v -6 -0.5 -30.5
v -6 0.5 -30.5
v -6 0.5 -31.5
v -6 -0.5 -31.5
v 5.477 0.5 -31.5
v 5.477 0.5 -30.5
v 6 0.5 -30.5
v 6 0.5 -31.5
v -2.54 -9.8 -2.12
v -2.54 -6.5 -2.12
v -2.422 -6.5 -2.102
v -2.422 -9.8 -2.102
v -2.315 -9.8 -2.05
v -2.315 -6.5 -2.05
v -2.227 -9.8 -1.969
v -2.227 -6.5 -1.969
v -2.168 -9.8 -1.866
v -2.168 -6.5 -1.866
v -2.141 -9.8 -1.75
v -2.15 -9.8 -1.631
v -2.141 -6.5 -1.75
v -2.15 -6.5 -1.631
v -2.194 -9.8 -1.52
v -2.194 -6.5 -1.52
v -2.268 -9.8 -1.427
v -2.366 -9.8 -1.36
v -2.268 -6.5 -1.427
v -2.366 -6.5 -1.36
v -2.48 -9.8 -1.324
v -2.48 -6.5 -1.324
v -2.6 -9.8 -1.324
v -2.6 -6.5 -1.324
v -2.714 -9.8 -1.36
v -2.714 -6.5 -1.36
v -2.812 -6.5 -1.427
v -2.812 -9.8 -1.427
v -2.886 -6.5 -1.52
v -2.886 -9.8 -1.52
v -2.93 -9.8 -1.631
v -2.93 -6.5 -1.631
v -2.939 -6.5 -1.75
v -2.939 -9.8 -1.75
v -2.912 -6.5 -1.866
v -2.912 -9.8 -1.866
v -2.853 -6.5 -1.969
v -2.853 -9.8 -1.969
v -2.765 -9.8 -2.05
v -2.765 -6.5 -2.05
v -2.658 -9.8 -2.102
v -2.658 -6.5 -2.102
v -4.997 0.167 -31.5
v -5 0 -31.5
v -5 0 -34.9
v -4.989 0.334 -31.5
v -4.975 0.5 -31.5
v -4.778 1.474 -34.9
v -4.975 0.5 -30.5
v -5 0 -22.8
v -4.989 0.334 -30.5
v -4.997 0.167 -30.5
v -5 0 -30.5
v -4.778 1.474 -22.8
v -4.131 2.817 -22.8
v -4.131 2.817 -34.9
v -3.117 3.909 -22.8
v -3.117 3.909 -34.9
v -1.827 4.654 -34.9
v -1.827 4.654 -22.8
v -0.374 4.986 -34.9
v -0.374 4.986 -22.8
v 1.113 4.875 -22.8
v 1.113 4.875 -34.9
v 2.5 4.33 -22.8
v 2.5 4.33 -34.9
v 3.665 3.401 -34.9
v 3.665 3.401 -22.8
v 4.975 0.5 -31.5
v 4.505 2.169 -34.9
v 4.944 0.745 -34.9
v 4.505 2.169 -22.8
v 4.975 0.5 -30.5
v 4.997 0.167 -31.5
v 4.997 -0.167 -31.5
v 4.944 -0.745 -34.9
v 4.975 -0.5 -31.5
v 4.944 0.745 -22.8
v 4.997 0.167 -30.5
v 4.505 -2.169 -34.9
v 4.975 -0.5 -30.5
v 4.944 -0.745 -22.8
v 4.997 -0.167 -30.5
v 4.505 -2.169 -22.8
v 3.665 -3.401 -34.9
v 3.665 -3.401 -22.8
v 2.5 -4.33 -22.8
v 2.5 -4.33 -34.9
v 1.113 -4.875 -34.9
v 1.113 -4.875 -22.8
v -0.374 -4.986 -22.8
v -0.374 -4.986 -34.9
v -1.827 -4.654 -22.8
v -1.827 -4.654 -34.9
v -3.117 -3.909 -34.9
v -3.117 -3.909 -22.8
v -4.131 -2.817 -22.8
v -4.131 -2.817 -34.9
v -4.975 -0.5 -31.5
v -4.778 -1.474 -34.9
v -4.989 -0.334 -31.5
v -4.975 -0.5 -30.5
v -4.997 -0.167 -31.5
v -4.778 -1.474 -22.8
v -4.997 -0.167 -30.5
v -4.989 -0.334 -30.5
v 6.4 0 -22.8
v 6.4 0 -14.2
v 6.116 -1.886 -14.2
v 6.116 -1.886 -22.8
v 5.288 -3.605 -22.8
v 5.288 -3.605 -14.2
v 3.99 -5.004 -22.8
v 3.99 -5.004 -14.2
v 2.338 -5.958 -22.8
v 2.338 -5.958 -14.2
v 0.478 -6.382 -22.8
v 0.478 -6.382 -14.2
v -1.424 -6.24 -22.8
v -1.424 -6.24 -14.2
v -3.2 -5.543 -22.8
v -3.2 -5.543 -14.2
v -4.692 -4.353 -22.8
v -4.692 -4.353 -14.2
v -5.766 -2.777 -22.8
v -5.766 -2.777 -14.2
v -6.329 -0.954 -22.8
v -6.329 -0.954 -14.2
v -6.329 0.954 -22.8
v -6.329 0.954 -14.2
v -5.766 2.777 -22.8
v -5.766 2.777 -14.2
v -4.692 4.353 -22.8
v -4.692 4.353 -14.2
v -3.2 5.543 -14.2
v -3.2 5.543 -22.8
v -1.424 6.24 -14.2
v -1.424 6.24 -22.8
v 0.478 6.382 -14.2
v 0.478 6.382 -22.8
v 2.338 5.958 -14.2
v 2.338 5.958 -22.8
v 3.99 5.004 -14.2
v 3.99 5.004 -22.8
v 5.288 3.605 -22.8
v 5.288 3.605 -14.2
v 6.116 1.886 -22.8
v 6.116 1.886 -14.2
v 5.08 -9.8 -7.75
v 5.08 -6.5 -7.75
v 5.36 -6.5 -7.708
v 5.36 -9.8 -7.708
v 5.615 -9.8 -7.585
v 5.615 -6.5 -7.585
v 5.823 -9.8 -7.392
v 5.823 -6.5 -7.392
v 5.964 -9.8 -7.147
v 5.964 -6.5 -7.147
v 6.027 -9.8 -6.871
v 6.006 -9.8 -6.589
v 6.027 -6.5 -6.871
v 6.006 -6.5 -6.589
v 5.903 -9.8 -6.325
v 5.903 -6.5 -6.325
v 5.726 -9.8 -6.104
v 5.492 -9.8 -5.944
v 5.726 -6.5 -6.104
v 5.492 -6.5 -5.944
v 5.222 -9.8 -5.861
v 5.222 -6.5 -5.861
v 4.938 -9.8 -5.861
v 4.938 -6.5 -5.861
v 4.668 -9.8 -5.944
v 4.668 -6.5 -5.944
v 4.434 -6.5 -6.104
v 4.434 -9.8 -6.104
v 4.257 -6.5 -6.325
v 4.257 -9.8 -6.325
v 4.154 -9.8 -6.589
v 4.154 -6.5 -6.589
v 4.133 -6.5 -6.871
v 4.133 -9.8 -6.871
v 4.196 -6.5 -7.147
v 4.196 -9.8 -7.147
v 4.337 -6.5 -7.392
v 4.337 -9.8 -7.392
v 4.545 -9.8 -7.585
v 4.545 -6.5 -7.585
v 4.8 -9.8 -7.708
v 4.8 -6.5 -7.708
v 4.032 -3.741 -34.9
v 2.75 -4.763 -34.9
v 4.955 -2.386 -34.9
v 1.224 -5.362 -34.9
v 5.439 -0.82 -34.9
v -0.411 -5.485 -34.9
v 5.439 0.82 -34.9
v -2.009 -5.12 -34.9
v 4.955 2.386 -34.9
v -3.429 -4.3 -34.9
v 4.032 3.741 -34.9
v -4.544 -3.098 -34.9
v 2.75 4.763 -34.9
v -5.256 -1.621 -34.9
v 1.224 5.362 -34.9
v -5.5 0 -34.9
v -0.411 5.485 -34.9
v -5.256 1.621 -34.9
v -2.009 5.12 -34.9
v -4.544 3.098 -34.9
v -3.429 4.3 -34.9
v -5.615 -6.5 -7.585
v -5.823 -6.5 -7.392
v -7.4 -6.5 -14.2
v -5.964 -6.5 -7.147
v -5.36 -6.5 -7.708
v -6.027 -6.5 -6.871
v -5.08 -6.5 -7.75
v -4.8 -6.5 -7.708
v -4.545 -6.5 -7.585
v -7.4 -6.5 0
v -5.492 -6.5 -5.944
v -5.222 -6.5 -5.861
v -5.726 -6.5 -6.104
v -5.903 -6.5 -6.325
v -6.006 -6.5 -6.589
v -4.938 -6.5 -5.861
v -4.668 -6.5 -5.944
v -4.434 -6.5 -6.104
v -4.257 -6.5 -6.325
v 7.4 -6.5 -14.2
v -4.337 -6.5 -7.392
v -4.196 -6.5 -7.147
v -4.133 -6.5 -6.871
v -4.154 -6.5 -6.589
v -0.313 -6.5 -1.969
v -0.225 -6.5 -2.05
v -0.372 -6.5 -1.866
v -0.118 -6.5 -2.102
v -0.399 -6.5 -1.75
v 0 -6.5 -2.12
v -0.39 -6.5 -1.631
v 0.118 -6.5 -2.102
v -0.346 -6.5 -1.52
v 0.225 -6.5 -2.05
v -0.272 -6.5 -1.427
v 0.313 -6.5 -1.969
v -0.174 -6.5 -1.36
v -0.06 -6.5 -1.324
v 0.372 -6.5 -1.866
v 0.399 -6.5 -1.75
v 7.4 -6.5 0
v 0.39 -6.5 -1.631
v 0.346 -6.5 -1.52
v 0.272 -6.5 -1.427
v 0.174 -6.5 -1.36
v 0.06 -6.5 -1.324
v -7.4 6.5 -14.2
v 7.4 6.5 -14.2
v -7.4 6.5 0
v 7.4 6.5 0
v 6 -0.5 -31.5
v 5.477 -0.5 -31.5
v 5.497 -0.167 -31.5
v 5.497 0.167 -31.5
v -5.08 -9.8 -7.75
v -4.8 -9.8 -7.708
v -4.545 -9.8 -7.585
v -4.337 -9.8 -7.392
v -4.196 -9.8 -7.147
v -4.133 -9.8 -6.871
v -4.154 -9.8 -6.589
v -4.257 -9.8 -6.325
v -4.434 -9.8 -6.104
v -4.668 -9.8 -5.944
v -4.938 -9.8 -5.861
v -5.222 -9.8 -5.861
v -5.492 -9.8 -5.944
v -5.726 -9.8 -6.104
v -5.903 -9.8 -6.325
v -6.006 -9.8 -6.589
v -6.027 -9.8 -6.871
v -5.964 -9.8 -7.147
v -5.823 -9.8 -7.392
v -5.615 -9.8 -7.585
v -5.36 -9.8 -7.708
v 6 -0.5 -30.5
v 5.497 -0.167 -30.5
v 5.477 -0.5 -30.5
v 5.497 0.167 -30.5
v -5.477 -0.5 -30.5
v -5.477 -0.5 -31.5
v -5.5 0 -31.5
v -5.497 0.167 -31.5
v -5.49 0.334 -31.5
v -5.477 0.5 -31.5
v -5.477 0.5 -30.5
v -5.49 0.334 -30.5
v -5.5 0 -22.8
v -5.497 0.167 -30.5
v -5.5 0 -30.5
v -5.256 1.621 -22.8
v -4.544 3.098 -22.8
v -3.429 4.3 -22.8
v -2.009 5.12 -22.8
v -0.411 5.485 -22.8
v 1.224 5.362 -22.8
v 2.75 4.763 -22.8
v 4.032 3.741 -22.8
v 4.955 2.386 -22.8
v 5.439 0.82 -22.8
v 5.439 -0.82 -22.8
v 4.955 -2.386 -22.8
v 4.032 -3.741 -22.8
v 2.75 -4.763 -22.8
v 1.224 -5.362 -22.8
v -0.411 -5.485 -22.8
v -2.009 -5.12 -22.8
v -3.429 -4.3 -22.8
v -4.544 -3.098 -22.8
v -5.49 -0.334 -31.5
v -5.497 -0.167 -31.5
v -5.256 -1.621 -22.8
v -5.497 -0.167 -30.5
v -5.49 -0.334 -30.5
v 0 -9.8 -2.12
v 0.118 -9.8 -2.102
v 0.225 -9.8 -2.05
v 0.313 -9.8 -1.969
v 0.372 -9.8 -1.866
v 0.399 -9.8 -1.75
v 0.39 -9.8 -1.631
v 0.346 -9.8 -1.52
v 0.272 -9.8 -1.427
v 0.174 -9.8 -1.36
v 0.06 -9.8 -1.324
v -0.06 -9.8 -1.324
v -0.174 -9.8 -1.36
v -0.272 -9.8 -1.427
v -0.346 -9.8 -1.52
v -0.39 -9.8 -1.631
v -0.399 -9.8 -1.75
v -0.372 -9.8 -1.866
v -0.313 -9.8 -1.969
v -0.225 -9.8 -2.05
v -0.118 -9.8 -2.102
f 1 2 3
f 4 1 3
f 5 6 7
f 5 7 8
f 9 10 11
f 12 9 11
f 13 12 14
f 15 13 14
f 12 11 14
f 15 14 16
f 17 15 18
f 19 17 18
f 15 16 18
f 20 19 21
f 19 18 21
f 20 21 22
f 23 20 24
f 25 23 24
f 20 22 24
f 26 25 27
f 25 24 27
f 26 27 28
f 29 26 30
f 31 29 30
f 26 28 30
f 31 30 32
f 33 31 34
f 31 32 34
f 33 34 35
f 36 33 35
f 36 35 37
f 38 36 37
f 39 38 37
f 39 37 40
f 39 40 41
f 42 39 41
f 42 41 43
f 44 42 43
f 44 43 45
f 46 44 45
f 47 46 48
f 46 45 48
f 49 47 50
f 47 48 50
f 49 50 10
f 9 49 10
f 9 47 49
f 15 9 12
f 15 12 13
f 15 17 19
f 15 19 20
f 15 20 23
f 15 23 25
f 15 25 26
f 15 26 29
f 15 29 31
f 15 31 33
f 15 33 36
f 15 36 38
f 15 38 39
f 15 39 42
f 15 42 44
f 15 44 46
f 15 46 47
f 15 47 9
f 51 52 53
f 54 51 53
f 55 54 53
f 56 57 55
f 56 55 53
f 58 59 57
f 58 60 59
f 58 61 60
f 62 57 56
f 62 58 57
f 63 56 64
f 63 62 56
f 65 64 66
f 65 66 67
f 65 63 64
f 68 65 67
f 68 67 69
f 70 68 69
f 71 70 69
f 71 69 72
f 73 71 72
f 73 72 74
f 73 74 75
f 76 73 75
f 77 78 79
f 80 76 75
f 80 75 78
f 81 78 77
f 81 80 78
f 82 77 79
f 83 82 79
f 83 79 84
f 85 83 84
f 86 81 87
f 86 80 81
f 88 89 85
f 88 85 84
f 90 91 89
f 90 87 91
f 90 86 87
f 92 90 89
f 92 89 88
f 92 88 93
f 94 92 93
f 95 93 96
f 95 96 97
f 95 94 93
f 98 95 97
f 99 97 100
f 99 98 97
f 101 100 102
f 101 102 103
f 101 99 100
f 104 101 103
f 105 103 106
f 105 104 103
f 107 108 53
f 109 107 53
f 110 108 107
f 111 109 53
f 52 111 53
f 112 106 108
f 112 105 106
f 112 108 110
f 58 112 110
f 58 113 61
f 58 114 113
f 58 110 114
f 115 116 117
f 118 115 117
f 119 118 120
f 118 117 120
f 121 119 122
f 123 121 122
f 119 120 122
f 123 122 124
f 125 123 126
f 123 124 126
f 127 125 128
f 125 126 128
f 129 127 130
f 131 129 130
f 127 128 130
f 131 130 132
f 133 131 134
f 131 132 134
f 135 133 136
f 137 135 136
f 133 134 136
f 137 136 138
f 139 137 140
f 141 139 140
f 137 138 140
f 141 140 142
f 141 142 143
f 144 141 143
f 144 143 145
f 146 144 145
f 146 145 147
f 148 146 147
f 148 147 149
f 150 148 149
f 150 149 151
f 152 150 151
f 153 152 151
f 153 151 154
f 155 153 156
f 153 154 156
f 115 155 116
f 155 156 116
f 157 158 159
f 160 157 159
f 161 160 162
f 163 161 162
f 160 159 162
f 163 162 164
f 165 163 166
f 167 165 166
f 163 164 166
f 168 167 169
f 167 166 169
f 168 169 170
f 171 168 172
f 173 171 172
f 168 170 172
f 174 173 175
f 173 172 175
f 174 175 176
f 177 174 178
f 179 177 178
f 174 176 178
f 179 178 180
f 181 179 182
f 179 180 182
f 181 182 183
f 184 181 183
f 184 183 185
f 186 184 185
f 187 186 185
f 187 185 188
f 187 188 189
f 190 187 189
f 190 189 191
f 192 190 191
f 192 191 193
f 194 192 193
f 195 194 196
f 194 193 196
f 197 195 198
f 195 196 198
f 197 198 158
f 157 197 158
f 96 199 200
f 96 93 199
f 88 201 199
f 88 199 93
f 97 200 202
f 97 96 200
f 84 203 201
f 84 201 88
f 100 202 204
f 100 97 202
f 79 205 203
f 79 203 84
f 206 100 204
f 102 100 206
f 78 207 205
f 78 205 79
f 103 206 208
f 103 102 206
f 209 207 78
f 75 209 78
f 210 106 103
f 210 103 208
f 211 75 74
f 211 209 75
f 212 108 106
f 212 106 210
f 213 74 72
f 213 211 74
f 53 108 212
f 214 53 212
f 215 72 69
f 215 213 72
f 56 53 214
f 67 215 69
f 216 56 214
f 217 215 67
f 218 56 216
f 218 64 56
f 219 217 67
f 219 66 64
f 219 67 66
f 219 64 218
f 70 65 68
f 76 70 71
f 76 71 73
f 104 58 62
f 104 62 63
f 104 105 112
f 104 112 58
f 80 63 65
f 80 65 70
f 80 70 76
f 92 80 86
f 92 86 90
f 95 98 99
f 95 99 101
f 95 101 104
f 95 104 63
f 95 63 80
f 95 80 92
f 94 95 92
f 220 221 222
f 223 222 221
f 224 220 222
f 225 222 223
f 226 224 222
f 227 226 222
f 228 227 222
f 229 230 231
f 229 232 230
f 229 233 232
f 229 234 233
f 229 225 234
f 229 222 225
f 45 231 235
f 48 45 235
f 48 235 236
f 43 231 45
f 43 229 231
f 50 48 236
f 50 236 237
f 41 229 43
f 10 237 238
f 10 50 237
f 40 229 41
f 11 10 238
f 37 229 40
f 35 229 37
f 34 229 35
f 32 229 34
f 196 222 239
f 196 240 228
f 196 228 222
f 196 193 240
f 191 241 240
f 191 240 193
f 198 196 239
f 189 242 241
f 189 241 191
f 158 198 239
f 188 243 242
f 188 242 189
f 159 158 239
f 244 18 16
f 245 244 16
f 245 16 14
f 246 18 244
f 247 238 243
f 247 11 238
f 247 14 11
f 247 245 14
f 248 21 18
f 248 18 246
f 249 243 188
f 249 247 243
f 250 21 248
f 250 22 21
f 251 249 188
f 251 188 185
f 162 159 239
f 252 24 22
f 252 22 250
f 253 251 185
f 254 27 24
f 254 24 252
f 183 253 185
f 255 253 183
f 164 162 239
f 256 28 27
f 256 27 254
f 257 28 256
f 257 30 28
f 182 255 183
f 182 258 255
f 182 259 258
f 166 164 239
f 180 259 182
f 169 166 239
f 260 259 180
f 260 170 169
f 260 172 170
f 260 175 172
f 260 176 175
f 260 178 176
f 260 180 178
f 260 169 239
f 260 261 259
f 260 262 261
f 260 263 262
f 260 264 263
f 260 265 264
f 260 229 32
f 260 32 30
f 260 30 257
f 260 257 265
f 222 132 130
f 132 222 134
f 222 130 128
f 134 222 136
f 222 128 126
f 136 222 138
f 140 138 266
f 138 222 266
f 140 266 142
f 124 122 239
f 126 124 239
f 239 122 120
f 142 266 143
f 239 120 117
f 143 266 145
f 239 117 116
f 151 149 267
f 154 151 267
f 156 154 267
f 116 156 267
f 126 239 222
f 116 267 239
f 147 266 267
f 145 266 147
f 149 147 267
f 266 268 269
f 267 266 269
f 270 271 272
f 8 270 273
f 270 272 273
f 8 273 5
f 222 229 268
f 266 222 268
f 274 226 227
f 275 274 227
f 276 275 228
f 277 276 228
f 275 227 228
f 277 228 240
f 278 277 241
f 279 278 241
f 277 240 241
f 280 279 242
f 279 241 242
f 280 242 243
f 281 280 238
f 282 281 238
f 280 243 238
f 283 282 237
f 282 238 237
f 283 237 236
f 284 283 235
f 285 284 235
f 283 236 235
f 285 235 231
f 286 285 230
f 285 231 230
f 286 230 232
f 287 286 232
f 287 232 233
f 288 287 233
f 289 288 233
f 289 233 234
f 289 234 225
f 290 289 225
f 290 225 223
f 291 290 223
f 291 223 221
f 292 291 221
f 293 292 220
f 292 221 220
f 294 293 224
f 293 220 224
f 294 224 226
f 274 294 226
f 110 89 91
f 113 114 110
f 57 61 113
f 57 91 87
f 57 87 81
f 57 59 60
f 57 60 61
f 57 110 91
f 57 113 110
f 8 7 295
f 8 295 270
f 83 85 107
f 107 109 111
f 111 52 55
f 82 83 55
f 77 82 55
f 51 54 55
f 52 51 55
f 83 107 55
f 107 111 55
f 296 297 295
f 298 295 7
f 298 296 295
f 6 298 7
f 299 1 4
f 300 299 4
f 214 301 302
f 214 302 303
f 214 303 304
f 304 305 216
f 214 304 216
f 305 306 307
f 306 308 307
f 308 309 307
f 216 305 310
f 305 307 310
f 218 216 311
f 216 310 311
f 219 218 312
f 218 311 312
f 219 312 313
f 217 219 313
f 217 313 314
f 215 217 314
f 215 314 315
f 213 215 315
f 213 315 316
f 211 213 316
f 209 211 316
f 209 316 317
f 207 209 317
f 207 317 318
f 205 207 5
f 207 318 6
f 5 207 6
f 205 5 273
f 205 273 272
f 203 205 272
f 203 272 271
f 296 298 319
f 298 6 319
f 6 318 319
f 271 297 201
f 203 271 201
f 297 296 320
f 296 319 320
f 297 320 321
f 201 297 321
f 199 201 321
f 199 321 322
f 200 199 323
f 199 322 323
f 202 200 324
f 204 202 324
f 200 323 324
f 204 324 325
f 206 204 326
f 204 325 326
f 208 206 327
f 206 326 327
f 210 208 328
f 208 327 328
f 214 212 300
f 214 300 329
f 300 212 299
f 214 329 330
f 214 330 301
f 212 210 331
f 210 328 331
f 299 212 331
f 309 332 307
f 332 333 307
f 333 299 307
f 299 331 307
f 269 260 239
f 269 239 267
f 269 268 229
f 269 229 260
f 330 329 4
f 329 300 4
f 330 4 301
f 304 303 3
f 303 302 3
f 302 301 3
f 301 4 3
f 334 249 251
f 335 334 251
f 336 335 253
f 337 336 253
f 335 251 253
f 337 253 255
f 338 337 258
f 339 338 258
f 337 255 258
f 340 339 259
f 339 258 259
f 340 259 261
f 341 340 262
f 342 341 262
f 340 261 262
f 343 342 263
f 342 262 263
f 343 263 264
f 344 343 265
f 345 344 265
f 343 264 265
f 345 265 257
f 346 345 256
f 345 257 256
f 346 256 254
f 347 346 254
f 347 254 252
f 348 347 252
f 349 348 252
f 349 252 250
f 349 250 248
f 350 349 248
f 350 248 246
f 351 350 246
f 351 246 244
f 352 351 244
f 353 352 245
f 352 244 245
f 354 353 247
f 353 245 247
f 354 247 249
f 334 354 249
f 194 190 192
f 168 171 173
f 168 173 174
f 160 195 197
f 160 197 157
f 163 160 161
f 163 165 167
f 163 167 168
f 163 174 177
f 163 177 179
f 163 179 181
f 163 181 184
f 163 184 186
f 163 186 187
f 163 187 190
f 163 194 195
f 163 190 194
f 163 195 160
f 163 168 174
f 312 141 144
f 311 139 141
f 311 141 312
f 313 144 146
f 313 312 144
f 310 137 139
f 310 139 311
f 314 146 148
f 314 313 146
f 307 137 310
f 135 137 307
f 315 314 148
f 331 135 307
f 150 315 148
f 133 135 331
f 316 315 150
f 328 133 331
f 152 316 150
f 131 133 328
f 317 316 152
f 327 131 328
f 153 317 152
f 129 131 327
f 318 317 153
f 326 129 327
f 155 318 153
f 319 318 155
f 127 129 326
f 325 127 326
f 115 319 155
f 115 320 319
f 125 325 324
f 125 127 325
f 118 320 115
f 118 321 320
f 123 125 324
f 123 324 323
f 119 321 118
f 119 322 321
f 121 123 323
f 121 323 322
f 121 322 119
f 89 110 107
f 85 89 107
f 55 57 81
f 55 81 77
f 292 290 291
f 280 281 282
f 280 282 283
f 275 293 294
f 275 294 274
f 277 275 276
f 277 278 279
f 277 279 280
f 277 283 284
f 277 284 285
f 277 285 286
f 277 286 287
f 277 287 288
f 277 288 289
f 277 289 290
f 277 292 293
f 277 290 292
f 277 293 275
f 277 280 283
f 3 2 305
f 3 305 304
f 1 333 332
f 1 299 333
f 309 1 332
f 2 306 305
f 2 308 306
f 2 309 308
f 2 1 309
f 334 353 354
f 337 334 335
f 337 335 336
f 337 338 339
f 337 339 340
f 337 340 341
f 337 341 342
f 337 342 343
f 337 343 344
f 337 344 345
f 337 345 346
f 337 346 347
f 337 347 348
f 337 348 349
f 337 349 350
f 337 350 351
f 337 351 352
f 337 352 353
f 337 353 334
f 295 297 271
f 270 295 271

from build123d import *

# Parameters (mm, degrees)
SKETCH_1_W           = 14.8
SKETCH_1_H           = 13
EXTRUDE_1_DEPTH      = 14.2
SKETCH_2_R           = 6.4
EXTRUDE_2_DEPTH      = 8.6
SKETCH_3_R           = 5.5
SKETCH_3_R_2         = 5
EXTRUDE_3_DEPTH      = 12.1
EXTRUDE_4_DEPTH      = 6
EXTRUDE_4_DEPTH_BACK = 6
SKETCH_4_W           = 1
SKETCH_4_H           = 1
SKETCH_7_R           = 0.95
SKETCH_7_R_2         = 0.4
EXTRUDE_5_DEPTH      = 3.3


with BuildPart() as part:
    # Эскиз1 → Бобышка-Вытянуть1 (new body)
    with BuildSketch(Plane.XY):
        Rectangle(SKETCH_1_W, SKETCH_1_H)
    extrude(amount=-EXTRUDE_1_DEPTH)

    # Эскиз2 → Бобышка-Вытянуть2 (add)
    with BuildSketch(Plane(origin=(0, 0, -14.2), x_dir=(-1, 0, 0), z_dir=(0, 0, -1))):
        with Locations(Location((0, 0, 0), (0, 0, 180))):
            Circle(SKETCH_2_R)
    extrude(amount=EXTRUDE_2_DEPTH)

    # Эскиз3 → Бобышка-Вытянуть3 (add)
    with BuildSketch(Plane(origin=(0, 0, -22.8), x_dir=(-1, 0, 0), z_dir=(0, 0, -1))):
        Circle(SKETCH_3_R)
        Circle(SKETCH_3_R_2, mode=Mode.SUBTRACT)
    extrude(amount=EXTRUDE_3_DEPTH)

    # Эскиз4 → Бобышка-Вытянуть4 (add, two sides: drawn at the far end of the back side and taken through both)
    with BuildSketch(Plane(origin=(0, 0, 0), x_dir=(0, 0, -1), z_dir=(1, 0, 0)).offset(-EXTRUDE_4_DEPTH_BACK)):
        with Locations((31, 0)):
            Rectangle(SKETCH_4_W, SKETCH_4_H)
    extrude(amount=EXTRUDE_4_DEPTH + EXTRUDE_4_DEPTH_BACK)

    # Эскиз7 → Бобышка-Вытянуть5 (add)
    with BuildSketch(Plane.XZ.offset(6.5)):
        with Locations(Location((5.08, -6.8, 0), (0, 0, 270))):
            Circle(SKETCH_7_R)
        with Locations(Location((-5.08, -6.8, 0), (0, 0, 270))):
            Circle(SKETCH_7_R)
        with Locations(Location((0, -1.72, 0), (0, 0, 270))):
            Circle(SKETCH_7_R_2)
        with Locations(Location((-2.54, -1.72, 0), (0, 0, 270))):
            Circle(SKETCH_7_R_2)
    extrude(amount=EXTRUDE_5_DEPTH)


solid = part.part
